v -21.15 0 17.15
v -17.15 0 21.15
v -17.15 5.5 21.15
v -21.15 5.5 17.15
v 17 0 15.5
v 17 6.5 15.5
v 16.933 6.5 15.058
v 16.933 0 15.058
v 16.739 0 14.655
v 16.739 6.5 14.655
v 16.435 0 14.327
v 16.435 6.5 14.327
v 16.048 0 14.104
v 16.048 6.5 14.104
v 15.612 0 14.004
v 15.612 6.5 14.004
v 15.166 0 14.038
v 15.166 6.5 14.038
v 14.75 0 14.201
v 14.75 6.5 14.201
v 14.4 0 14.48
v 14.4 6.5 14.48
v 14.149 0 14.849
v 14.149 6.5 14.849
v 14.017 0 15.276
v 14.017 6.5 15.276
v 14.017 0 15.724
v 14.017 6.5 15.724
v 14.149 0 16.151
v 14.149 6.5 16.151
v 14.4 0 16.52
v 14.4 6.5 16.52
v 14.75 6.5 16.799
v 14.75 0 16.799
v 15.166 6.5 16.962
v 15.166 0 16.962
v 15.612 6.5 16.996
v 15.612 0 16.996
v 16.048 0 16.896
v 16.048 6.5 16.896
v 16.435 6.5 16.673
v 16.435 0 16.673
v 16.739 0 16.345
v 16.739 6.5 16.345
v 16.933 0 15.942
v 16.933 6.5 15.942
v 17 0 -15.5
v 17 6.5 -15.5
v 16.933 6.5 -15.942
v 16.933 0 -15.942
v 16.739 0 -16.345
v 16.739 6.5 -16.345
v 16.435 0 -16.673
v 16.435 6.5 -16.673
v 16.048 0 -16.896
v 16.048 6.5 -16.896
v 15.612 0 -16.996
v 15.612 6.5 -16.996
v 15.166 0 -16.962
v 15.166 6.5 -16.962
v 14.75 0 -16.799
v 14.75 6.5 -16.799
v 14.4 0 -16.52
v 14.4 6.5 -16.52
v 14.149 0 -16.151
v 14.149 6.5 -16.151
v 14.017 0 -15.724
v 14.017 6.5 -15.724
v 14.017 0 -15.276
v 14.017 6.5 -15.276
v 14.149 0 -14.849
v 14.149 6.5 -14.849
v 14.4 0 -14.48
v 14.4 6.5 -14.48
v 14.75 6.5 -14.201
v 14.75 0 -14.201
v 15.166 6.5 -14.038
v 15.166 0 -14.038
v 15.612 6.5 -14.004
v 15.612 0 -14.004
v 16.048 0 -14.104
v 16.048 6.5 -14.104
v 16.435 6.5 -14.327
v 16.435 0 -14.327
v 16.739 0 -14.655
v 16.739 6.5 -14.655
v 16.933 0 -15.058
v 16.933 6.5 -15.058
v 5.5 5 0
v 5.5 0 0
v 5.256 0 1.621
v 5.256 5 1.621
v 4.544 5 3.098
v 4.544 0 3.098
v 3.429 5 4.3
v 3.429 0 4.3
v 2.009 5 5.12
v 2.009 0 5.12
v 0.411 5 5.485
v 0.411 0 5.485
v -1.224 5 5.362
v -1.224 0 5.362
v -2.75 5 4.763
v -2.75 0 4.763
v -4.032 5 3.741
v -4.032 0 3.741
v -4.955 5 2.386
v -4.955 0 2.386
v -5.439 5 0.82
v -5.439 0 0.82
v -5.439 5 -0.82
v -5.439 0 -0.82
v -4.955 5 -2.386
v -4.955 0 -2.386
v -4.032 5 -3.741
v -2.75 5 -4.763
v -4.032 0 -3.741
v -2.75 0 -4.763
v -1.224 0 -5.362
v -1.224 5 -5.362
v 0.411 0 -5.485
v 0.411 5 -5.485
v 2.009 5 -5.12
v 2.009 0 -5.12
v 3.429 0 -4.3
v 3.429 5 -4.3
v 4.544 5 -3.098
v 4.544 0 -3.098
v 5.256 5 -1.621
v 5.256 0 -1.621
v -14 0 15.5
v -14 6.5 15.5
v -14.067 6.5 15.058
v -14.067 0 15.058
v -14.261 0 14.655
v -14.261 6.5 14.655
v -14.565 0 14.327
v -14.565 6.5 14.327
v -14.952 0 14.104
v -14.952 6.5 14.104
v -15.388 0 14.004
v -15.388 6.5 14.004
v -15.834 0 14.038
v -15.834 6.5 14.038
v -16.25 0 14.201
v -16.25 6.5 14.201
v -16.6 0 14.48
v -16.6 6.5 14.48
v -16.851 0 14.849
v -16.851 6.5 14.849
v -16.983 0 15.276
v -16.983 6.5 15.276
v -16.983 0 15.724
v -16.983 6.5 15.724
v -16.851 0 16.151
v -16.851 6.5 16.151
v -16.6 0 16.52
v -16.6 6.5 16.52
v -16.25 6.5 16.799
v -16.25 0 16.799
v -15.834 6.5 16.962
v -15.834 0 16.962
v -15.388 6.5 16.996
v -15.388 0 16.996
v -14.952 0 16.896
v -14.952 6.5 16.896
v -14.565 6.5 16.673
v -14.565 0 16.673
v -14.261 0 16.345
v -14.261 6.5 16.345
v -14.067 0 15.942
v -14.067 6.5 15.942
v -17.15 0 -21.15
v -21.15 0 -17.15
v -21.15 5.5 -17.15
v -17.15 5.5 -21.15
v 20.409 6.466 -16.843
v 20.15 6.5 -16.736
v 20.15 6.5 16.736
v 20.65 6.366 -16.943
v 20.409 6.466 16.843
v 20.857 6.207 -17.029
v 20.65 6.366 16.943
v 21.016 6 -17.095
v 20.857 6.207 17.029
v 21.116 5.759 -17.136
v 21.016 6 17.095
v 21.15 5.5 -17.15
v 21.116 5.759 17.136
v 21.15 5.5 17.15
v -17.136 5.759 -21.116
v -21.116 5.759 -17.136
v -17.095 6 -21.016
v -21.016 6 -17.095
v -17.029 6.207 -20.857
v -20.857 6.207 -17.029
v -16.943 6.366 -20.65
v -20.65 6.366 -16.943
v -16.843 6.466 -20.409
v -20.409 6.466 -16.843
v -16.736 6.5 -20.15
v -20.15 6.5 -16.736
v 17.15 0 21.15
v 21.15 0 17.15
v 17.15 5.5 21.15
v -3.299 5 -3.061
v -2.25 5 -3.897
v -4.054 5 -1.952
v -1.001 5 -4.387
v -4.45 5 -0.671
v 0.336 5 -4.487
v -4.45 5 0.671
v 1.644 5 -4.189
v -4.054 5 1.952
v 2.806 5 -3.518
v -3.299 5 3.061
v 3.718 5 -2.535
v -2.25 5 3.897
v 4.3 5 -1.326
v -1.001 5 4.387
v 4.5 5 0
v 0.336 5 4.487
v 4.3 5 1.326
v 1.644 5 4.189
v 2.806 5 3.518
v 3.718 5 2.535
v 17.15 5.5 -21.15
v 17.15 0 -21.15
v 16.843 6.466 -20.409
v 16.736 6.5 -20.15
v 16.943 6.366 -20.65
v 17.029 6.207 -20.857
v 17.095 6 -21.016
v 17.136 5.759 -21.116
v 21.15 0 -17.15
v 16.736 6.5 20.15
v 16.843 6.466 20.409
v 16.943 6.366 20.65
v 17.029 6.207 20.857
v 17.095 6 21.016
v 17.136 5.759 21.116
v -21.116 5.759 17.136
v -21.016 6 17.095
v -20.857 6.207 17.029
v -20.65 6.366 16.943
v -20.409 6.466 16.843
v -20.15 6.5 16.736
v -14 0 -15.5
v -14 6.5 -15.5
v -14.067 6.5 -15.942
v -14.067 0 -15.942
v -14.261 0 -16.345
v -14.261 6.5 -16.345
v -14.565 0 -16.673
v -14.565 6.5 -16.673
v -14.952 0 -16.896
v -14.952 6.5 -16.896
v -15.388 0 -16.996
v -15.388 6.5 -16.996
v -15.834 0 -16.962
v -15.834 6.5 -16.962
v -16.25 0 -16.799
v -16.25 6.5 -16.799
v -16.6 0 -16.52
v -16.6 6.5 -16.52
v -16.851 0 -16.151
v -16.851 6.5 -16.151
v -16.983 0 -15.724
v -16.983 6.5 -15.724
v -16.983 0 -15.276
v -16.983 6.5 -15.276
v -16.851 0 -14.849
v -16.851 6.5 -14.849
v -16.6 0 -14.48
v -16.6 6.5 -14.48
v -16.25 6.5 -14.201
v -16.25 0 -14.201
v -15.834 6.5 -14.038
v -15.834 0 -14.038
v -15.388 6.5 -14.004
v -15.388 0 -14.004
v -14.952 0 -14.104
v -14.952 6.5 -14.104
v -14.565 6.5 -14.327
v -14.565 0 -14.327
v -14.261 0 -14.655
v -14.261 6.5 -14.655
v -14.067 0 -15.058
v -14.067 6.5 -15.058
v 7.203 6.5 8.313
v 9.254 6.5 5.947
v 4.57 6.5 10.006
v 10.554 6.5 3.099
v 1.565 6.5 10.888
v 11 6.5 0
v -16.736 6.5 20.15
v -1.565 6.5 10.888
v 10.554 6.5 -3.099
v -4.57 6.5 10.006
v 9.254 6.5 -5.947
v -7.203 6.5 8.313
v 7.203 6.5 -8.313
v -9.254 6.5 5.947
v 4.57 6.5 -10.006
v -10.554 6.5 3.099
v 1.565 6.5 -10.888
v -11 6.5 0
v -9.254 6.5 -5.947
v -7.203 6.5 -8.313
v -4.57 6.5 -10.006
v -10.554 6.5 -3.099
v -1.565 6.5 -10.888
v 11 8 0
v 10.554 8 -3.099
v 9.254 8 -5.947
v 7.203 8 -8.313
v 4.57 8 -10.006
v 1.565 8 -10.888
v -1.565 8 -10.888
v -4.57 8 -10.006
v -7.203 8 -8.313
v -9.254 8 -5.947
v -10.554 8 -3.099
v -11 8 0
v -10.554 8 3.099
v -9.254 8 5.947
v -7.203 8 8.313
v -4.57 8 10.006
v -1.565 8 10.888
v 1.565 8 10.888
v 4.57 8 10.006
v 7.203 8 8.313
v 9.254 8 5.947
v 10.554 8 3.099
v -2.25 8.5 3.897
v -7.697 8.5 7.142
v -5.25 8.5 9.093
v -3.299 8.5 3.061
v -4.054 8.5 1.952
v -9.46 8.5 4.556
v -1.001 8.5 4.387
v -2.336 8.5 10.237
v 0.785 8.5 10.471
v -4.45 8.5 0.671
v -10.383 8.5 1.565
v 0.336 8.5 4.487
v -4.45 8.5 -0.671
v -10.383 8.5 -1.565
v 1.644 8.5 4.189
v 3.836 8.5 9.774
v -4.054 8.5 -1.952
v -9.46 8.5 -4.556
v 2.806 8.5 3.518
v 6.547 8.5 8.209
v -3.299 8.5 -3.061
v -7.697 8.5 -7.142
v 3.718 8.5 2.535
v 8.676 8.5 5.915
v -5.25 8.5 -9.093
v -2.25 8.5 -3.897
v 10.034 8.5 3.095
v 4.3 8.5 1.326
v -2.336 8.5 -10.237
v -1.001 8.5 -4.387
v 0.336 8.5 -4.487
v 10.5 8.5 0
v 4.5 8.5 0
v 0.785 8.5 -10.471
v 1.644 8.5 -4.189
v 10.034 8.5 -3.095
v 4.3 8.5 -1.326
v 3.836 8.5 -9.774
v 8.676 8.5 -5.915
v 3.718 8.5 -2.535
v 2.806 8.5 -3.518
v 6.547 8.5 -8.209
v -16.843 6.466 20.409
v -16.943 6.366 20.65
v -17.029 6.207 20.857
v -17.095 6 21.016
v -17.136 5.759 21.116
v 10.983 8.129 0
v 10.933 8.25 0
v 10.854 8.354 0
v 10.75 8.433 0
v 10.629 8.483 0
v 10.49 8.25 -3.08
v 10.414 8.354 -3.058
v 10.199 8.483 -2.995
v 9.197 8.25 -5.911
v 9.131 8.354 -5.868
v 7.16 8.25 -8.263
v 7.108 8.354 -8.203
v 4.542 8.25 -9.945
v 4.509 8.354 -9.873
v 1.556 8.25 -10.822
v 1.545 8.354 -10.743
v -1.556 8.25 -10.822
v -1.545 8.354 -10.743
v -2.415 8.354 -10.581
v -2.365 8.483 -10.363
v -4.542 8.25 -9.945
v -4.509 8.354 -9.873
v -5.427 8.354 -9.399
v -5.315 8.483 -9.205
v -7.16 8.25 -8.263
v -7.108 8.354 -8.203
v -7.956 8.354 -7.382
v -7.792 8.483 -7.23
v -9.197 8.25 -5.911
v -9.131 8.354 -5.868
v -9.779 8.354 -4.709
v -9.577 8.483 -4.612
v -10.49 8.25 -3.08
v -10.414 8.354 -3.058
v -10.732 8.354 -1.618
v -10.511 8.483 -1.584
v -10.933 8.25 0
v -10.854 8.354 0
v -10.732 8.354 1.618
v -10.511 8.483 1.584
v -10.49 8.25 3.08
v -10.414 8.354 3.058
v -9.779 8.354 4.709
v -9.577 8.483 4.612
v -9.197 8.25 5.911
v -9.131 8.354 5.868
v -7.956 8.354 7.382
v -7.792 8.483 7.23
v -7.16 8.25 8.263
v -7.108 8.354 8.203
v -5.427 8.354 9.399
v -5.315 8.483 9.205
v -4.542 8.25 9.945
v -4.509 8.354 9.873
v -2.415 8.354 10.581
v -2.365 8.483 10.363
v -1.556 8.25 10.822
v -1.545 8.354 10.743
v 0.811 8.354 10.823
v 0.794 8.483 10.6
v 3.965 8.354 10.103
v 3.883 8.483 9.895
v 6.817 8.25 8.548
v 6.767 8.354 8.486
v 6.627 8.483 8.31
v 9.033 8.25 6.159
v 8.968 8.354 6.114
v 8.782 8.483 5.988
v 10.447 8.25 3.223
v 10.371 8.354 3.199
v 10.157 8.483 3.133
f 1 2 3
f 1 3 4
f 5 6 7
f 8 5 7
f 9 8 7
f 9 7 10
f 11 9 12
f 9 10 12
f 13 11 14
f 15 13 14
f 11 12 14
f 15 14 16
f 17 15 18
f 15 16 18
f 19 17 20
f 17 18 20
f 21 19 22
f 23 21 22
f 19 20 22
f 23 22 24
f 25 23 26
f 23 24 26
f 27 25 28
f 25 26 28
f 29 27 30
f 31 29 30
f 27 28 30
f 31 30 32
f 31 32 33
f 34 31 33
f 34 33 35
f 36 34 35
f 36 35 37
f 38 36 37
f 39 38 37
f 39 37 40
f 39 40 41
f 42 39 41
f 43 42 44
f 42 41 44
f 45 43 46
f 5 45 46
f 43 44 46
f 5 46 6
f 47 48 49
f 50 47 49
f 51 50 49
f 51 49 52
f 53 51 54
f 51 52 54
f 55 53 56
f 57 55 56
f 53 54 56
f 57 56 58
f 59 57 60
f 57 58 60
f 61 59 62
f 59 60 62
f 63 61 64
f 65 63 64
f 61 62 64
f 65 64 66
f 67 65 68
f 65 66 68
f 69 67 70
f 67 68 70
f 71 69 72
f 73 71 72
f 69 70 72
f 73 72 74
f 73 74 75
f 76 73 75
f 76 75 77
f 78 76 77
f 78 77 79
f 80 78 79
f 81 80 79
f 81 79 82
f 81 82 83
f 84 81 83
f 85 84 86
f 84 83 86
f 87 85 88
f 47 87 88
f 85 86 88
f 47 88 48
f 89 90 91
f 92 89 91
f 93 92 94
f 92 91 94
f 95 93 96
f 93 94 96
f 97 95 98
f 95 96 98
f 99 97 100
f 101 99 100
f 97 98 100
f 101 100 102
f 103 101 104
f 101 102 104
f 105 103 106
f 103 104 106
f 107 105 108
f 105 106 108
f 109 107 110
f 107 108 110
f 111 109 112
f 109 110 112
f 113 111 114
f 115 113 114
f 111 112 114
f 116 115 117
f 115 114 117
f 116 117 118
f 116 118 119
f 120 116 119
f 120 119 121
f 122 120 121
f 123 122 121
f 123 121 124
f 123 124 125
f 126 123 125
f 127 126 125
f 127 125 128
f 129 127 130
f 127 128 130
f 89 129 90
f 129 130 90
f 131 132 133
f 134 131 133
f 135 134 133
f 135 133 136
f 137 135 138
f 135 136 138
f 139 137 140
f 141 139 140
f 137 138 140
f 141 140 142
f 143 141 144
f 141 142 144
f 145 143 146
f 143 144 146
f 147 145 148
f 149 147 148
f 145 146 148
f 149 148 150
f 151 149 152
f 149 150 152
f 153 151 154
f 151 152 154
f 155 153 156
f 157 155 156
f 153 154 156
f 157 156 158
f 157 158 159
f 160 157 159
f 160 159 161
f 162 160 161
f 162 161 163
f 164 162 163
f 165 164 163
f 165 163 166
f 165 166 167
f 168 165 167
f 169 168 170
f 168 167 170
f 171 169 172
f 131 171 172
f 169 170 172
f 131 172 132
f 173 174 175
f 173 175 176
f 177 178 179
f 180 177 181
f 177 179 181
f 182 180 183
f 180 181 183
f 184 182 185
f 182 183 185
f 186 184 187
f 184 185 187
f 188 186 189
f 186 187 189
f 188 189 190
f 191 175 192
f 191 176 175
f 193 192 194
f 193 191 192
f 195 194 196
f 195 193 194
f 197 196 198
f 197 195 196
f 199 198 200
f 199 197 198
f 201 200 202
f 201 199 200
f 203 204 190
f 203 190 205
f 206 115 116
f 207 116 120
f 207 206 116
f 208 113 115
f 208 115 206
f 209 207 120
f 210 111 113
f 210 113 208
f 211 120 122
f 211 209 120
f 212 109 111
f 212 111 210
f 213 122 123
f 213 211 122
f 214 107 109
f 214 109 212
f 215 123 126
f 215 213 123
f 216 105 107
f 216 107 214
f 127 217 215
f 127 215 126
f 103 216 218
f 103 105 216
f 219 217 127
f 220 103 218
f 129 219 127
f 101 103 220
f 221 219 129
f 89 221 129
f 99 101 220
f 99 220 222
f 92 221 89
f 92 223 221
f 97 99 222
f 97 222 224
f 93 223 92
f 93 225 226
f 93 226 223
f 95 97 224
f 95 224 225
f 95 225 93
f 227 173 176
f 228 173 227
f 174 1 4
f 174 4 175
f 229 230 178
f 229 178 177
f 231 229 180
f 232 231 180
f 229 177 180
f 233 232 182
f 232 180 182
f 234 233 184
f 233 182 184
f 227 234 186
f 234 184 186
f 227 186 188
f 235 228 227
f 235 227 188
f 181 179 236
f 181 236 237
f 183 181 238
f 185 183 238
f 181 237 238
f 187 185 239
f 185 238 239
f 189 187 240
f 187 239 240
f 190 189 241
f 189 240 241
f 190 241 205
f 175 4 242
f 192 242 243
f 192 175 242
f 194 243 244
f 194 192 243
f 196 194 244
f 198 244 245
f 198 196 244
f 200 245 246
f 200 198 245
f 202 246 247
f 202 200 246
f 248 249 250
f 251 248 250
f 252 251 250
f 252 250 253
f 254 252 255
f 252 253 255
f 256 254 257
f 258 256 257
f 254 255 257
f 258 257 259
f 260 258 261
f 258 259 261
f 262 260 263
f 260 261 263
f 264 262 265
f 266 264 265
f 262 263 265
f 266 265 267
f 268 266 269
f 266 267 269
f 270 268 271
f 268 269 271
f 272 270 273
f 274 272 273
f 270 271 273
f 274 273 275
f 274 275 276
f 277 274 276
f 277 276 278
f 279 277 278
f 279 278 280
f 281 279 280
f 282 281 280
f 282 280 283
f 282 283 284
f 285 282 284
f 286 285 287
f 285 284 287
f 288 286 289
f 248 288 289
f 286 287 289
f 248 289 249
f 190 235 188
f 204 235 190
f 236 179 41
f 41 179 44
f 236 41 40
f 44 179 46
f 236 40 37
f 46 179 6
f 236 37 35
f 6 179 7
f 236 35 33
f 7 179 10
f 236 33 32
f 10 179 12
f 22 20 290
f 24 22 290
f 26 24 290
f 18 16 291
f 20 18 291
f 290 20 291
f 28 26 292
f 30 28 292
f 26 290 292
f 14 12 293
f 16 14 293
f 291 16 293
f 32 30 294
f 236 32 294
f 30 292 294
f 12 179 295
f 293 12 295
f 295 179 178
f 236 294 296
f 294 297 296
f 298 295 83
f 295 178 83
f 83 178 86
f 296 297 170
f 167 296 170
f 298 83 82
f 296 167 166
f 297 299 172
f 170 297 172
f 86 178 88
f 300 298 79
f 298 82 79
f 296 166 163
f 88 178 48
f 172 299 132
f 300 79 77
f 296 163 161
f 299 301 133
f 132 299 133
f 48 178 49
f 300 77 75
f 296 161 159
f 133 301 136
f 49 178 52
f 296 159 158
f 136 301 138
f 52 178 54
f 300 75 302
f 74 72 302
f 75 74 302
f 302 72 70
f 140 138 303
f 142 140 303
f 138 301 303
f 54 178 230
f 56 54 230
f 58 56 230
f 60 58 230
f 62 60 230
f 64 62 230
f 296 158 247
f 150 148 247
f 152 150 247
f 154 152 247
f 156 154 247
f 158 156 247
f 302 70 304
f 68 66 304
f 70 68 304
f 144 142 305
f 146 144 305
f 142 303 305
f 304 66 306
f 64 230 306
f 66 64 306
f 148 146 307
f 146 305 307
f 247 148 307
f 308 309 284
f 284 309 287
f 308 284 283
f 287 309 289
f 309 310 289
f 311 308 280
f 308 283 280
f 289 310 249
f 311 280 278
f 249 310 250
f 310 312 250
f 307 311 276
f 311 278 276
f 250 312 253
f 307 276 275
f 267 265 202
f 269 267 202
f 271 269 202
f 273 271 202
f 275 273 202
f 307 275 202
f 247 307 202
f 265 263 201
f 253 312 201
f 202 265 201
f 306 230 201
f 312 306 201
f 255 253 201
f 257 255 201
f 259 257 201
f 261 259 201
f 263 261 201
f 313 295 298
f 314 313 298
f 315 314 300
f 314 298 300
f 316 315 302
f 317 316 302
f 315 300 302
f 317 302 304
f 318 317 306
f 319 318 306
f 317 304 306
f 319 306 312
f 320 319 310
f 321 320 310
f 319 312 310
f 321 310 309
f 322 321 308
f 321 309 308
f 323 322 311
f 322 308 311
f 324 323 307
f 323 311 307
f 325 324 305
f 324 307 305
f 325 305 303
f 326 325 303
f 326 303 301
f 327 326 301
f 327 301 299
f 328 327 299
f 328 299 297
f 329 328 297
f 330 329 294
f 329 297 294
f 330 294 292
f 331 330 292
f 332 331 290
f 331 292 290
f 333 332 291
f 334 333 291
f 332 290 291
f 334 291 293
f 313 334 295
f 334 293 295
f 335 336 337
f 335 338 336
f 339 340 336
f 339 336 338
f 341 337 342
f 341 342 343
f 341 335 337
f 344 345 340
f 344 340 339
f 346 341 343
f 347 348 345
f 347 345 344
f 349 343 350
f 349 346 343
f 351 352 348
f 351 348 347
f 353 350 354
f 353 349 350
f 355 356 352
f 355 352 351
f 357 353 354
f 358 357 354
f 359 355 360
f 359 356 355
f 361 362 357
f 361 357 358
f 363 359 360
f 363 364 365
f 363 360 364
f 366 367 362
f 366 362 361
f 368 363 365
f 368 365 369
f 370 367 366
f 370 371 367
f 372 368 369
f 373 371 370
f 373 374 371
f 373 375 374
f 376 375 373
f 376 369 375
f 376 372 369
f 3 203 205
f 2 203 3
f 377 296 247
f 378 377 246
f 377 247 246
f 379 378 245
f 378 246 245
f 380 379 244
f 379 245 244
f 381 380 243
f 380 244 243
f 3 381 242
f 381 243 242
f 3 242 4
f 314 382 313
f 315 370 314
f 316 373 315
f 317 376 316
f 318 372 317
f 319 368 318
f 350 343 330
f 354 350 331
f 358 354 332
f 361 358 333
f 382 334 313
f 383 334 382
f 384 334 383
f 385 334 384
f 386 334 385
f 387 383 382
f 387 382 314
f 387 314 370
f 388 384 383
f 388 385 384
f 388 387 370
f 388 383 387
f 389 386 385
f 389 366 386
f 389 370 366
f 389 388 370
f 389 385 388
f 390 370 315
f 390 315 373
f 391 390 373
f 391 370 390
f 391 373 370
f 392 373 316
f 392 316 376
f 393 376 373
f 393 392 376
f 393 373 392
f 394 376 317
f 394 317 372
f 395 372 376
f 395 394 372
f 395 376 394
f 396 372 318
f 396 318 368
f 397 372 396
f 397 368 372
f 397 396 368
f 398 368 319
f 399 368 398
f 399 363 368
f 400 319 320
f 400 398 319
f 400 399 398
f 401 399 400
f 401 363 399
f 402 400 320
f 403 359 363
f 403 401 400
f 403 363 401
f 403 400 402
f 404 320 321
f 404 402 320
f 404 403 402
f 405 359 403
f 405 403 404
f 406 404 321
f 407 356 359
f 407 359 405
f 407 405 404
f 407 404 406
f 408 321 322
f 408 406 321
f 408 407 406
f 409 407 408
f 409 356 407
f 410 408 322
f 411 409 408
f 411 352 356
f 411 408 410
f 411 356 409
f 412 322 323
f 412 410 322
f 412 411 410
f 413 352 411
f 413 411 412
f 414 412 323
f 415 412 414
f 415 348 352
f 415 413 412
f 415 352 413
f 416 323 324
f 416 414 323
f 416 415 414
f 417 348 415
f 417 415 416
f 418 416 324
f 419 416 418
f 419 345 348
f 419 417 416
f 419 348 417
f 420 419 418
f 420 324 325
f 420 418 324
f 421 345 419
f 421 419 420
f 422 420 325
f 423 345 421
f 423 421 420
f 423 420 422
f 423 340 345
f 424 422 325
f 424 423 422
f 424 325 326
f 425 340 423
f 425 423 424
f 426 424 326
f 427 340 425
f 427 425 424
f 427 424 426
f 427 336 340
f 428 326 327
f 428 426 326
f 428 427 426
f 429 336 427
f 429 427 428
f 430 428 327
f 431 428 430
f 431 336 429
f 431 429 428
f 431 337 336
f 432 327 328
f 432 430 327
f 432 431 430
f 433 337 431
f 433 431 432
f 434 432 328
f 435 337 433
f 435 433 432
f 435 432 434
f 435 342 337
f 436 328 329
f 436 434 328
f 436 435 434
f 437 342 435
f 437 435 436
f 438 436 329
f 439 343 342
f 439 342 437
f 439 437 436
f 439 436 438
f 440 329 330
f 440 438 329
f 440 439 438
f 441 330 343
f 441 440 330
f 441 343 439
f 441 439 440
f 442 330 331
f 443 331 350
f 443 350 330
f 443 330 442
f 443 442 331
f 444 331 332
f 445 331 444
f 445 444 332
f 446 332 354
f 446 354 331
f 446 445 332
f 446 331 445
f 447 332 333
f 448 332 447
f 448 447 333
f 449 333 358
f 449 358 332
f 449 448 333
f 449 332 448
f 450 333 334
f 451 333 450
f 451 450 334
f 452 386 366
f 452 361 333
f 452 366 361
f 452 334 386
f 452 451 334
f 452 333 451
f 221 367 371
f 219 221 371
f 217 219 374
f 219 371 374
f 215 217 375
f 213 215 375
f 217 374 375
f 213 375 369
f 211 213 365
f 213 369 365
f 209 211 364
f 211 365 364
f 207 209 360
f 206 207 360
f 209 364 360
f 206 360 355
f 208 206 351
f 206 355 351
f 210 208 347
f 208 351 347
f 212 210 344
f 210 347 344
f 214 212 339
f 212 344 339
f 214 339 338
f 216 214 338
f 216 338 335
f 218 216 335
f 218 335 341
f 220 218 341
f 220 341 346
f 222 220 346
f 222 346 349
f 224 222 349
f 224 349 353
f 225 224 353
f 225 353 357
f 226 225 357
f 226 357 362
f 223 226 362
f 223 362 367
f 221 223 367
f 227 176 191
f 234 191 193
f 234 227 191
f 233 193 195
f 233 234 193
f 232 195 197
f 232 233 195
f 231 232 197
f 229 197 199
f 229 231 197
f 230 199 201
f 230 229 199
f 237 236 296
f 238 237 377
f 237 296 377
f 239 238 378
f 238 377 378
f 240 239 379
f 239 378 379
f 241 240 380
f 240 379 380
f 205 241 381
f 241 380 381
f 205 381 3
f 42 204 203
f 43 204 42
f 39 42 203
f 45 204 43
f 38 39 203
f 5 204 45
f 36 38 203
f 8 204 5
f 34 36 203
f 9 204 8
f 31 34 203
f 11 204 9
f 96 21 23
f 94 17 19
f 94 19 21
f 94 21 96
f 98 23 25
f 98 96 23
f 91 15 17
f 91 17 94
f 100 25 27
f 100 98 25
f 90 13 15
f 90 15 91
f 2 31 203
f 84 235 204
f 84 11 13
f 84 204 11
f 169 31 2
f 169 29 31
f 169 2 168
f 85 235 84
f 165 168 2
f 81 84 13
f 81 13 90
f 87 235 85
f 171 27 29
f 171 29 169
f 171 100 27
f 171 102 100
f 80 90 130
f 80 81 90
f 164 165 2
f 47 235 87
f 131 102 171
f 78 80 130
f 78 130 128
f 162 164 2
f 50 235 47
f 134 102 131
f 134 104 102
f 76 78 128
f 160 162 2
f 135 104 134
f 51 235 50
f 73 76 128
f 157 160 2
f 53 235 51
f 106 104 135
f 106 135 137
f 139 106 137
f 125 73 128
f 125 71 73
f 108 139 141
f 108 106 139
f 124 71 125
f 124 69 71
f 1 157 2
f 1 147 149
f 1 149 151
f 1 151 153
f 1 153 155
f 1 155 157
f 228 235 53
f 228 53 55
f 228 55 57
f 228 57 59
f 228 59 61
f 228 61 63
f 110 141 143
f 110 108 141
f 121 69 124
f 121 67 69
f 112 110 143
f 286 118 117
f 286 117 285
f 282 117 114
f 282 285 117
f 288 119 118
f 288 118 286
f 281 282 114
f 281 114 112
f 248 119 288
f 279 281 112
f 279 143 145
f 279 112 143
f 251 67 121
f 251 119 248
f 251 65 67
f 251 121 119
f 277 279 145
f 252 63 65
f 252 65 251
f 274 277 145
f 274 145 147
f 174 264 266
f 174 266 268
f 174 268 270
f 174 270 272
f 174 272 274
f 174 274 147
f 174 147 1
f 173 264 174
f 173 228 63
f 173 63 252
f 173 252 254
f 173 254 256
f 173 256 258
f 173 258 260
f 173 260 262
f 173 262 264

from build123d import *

# Parameters (mm, degrees)
BOSS_EXTRUDE1_DEPTH = 6.5
SKETCH2_R           = 11
BOSS_EXTRUDE2_DEPTH = 2
SKETCH3_R           = 1.5
CUT_EXTRUDE2_DEPTH  = 6.5
SKETCH4_R           = 4.5
CUT_EXTRUDE3_DEPTH  = 8.5
SKETCH5_R           = 5.5
CUT_EXTRUDE4_DEPTH  = 5
FILLET1_R           = 1
FILLET2_R           = 0.5


with BuildPart() as part:
    # Sketch1 → Boss-Extrude1 (new body)
    with BuildSketch(Plane(origin=(0, 0, 0), x_dir=(1, 0, 0), z_dir=(0, 1, 0))):
        Polygon((-21.15, 17.15), (-17.15, 21.15), (17.15, 21.15), (21.15, 17.15), (21.15, -17.15), (17.15, -21.15), (-17.15, -21.15), (-21.15, -17.15), align=None)
    extrude(amount=BOSS_EXTRUDE1_DEPTH)

    # Sketch2 → Boss-Extrude2 (add)
    with BuildSketch(Plane(origin=(0, 6.5, 0), x_dir=(1, 0, 0), z_dir=(0, 1, 0))):
        Circle(SKETCH2_R)
    extrude(amount=BOSS_EXTRUDE2_DEPTH)

    # Sketch3 → Cut-Extrude2 (cut)
    with BuildSketch(Plane(origin=(0, 6.5, 0), x_dir=(1, 0, 0), z_dir=(0, 1, 0))):
        with Locations((-15.5, 15.5)):
            Circle(SKETCH3_R)
        with Locations((15.5, 15.5)):
            Circle(SKETCH3_R)
        with Locations((-15.5, -15.5)):
            Circle(SKETCH3_R)
        with Locations((15.5, -15.5)):
            Circle(SKETCH3_R)
    extrude(amount=-CUT_EXTRUDE2_DEPTH, mode=Mode.SUBTRACT)

    # Sketch4 → Cut-Extrude3 (cut)
    with BuildSketch(Plane(origin=(0, 8.5, 0), x_dir=(1, 0, 0), z_dir=(0, 1, 0))):
        Circle(SKETCH4_R)
    extrude(amount=-CUT_EXTRUDE3_DEPTH, mode=Mode.SUBTRACT)

    # Sketch5 → Cut-Extrude4 (cut)
    with BuildSketch(Plane.XZ):
        Circle(SKETCH5_R)
    extrude(amount=-CUT_EXTRUDE4_DEPTH, mode=Mode.SUBTRACT)

    # Fillet1
    fillet1_edges = [part.edges().sort_by_distance(p)[0] for p in [
        (-21.15, 6.5, 0),
        (-19.15, 6.5, 19.15),
        (0, 6.5, 21.15),
        (19.15, 6.5, 19.15),
        (21.15, 6.5, 0),
        (19.15, 6.5, -19.15),
        (0, 6.5, -21.15),
        (-19.15, 6.5, -19.15),
    ]]
    fillet(fillet1_edges, radius=FILLET1_R)

    # Fillet2
    fillet2_edges = [part.edges().sort_by_distance(p)[0] for p in [
        (-11, 8.5, 0),
    ]]
    fillet(fillet2_edges, radius=FILLET2_R)


solid = part.part
